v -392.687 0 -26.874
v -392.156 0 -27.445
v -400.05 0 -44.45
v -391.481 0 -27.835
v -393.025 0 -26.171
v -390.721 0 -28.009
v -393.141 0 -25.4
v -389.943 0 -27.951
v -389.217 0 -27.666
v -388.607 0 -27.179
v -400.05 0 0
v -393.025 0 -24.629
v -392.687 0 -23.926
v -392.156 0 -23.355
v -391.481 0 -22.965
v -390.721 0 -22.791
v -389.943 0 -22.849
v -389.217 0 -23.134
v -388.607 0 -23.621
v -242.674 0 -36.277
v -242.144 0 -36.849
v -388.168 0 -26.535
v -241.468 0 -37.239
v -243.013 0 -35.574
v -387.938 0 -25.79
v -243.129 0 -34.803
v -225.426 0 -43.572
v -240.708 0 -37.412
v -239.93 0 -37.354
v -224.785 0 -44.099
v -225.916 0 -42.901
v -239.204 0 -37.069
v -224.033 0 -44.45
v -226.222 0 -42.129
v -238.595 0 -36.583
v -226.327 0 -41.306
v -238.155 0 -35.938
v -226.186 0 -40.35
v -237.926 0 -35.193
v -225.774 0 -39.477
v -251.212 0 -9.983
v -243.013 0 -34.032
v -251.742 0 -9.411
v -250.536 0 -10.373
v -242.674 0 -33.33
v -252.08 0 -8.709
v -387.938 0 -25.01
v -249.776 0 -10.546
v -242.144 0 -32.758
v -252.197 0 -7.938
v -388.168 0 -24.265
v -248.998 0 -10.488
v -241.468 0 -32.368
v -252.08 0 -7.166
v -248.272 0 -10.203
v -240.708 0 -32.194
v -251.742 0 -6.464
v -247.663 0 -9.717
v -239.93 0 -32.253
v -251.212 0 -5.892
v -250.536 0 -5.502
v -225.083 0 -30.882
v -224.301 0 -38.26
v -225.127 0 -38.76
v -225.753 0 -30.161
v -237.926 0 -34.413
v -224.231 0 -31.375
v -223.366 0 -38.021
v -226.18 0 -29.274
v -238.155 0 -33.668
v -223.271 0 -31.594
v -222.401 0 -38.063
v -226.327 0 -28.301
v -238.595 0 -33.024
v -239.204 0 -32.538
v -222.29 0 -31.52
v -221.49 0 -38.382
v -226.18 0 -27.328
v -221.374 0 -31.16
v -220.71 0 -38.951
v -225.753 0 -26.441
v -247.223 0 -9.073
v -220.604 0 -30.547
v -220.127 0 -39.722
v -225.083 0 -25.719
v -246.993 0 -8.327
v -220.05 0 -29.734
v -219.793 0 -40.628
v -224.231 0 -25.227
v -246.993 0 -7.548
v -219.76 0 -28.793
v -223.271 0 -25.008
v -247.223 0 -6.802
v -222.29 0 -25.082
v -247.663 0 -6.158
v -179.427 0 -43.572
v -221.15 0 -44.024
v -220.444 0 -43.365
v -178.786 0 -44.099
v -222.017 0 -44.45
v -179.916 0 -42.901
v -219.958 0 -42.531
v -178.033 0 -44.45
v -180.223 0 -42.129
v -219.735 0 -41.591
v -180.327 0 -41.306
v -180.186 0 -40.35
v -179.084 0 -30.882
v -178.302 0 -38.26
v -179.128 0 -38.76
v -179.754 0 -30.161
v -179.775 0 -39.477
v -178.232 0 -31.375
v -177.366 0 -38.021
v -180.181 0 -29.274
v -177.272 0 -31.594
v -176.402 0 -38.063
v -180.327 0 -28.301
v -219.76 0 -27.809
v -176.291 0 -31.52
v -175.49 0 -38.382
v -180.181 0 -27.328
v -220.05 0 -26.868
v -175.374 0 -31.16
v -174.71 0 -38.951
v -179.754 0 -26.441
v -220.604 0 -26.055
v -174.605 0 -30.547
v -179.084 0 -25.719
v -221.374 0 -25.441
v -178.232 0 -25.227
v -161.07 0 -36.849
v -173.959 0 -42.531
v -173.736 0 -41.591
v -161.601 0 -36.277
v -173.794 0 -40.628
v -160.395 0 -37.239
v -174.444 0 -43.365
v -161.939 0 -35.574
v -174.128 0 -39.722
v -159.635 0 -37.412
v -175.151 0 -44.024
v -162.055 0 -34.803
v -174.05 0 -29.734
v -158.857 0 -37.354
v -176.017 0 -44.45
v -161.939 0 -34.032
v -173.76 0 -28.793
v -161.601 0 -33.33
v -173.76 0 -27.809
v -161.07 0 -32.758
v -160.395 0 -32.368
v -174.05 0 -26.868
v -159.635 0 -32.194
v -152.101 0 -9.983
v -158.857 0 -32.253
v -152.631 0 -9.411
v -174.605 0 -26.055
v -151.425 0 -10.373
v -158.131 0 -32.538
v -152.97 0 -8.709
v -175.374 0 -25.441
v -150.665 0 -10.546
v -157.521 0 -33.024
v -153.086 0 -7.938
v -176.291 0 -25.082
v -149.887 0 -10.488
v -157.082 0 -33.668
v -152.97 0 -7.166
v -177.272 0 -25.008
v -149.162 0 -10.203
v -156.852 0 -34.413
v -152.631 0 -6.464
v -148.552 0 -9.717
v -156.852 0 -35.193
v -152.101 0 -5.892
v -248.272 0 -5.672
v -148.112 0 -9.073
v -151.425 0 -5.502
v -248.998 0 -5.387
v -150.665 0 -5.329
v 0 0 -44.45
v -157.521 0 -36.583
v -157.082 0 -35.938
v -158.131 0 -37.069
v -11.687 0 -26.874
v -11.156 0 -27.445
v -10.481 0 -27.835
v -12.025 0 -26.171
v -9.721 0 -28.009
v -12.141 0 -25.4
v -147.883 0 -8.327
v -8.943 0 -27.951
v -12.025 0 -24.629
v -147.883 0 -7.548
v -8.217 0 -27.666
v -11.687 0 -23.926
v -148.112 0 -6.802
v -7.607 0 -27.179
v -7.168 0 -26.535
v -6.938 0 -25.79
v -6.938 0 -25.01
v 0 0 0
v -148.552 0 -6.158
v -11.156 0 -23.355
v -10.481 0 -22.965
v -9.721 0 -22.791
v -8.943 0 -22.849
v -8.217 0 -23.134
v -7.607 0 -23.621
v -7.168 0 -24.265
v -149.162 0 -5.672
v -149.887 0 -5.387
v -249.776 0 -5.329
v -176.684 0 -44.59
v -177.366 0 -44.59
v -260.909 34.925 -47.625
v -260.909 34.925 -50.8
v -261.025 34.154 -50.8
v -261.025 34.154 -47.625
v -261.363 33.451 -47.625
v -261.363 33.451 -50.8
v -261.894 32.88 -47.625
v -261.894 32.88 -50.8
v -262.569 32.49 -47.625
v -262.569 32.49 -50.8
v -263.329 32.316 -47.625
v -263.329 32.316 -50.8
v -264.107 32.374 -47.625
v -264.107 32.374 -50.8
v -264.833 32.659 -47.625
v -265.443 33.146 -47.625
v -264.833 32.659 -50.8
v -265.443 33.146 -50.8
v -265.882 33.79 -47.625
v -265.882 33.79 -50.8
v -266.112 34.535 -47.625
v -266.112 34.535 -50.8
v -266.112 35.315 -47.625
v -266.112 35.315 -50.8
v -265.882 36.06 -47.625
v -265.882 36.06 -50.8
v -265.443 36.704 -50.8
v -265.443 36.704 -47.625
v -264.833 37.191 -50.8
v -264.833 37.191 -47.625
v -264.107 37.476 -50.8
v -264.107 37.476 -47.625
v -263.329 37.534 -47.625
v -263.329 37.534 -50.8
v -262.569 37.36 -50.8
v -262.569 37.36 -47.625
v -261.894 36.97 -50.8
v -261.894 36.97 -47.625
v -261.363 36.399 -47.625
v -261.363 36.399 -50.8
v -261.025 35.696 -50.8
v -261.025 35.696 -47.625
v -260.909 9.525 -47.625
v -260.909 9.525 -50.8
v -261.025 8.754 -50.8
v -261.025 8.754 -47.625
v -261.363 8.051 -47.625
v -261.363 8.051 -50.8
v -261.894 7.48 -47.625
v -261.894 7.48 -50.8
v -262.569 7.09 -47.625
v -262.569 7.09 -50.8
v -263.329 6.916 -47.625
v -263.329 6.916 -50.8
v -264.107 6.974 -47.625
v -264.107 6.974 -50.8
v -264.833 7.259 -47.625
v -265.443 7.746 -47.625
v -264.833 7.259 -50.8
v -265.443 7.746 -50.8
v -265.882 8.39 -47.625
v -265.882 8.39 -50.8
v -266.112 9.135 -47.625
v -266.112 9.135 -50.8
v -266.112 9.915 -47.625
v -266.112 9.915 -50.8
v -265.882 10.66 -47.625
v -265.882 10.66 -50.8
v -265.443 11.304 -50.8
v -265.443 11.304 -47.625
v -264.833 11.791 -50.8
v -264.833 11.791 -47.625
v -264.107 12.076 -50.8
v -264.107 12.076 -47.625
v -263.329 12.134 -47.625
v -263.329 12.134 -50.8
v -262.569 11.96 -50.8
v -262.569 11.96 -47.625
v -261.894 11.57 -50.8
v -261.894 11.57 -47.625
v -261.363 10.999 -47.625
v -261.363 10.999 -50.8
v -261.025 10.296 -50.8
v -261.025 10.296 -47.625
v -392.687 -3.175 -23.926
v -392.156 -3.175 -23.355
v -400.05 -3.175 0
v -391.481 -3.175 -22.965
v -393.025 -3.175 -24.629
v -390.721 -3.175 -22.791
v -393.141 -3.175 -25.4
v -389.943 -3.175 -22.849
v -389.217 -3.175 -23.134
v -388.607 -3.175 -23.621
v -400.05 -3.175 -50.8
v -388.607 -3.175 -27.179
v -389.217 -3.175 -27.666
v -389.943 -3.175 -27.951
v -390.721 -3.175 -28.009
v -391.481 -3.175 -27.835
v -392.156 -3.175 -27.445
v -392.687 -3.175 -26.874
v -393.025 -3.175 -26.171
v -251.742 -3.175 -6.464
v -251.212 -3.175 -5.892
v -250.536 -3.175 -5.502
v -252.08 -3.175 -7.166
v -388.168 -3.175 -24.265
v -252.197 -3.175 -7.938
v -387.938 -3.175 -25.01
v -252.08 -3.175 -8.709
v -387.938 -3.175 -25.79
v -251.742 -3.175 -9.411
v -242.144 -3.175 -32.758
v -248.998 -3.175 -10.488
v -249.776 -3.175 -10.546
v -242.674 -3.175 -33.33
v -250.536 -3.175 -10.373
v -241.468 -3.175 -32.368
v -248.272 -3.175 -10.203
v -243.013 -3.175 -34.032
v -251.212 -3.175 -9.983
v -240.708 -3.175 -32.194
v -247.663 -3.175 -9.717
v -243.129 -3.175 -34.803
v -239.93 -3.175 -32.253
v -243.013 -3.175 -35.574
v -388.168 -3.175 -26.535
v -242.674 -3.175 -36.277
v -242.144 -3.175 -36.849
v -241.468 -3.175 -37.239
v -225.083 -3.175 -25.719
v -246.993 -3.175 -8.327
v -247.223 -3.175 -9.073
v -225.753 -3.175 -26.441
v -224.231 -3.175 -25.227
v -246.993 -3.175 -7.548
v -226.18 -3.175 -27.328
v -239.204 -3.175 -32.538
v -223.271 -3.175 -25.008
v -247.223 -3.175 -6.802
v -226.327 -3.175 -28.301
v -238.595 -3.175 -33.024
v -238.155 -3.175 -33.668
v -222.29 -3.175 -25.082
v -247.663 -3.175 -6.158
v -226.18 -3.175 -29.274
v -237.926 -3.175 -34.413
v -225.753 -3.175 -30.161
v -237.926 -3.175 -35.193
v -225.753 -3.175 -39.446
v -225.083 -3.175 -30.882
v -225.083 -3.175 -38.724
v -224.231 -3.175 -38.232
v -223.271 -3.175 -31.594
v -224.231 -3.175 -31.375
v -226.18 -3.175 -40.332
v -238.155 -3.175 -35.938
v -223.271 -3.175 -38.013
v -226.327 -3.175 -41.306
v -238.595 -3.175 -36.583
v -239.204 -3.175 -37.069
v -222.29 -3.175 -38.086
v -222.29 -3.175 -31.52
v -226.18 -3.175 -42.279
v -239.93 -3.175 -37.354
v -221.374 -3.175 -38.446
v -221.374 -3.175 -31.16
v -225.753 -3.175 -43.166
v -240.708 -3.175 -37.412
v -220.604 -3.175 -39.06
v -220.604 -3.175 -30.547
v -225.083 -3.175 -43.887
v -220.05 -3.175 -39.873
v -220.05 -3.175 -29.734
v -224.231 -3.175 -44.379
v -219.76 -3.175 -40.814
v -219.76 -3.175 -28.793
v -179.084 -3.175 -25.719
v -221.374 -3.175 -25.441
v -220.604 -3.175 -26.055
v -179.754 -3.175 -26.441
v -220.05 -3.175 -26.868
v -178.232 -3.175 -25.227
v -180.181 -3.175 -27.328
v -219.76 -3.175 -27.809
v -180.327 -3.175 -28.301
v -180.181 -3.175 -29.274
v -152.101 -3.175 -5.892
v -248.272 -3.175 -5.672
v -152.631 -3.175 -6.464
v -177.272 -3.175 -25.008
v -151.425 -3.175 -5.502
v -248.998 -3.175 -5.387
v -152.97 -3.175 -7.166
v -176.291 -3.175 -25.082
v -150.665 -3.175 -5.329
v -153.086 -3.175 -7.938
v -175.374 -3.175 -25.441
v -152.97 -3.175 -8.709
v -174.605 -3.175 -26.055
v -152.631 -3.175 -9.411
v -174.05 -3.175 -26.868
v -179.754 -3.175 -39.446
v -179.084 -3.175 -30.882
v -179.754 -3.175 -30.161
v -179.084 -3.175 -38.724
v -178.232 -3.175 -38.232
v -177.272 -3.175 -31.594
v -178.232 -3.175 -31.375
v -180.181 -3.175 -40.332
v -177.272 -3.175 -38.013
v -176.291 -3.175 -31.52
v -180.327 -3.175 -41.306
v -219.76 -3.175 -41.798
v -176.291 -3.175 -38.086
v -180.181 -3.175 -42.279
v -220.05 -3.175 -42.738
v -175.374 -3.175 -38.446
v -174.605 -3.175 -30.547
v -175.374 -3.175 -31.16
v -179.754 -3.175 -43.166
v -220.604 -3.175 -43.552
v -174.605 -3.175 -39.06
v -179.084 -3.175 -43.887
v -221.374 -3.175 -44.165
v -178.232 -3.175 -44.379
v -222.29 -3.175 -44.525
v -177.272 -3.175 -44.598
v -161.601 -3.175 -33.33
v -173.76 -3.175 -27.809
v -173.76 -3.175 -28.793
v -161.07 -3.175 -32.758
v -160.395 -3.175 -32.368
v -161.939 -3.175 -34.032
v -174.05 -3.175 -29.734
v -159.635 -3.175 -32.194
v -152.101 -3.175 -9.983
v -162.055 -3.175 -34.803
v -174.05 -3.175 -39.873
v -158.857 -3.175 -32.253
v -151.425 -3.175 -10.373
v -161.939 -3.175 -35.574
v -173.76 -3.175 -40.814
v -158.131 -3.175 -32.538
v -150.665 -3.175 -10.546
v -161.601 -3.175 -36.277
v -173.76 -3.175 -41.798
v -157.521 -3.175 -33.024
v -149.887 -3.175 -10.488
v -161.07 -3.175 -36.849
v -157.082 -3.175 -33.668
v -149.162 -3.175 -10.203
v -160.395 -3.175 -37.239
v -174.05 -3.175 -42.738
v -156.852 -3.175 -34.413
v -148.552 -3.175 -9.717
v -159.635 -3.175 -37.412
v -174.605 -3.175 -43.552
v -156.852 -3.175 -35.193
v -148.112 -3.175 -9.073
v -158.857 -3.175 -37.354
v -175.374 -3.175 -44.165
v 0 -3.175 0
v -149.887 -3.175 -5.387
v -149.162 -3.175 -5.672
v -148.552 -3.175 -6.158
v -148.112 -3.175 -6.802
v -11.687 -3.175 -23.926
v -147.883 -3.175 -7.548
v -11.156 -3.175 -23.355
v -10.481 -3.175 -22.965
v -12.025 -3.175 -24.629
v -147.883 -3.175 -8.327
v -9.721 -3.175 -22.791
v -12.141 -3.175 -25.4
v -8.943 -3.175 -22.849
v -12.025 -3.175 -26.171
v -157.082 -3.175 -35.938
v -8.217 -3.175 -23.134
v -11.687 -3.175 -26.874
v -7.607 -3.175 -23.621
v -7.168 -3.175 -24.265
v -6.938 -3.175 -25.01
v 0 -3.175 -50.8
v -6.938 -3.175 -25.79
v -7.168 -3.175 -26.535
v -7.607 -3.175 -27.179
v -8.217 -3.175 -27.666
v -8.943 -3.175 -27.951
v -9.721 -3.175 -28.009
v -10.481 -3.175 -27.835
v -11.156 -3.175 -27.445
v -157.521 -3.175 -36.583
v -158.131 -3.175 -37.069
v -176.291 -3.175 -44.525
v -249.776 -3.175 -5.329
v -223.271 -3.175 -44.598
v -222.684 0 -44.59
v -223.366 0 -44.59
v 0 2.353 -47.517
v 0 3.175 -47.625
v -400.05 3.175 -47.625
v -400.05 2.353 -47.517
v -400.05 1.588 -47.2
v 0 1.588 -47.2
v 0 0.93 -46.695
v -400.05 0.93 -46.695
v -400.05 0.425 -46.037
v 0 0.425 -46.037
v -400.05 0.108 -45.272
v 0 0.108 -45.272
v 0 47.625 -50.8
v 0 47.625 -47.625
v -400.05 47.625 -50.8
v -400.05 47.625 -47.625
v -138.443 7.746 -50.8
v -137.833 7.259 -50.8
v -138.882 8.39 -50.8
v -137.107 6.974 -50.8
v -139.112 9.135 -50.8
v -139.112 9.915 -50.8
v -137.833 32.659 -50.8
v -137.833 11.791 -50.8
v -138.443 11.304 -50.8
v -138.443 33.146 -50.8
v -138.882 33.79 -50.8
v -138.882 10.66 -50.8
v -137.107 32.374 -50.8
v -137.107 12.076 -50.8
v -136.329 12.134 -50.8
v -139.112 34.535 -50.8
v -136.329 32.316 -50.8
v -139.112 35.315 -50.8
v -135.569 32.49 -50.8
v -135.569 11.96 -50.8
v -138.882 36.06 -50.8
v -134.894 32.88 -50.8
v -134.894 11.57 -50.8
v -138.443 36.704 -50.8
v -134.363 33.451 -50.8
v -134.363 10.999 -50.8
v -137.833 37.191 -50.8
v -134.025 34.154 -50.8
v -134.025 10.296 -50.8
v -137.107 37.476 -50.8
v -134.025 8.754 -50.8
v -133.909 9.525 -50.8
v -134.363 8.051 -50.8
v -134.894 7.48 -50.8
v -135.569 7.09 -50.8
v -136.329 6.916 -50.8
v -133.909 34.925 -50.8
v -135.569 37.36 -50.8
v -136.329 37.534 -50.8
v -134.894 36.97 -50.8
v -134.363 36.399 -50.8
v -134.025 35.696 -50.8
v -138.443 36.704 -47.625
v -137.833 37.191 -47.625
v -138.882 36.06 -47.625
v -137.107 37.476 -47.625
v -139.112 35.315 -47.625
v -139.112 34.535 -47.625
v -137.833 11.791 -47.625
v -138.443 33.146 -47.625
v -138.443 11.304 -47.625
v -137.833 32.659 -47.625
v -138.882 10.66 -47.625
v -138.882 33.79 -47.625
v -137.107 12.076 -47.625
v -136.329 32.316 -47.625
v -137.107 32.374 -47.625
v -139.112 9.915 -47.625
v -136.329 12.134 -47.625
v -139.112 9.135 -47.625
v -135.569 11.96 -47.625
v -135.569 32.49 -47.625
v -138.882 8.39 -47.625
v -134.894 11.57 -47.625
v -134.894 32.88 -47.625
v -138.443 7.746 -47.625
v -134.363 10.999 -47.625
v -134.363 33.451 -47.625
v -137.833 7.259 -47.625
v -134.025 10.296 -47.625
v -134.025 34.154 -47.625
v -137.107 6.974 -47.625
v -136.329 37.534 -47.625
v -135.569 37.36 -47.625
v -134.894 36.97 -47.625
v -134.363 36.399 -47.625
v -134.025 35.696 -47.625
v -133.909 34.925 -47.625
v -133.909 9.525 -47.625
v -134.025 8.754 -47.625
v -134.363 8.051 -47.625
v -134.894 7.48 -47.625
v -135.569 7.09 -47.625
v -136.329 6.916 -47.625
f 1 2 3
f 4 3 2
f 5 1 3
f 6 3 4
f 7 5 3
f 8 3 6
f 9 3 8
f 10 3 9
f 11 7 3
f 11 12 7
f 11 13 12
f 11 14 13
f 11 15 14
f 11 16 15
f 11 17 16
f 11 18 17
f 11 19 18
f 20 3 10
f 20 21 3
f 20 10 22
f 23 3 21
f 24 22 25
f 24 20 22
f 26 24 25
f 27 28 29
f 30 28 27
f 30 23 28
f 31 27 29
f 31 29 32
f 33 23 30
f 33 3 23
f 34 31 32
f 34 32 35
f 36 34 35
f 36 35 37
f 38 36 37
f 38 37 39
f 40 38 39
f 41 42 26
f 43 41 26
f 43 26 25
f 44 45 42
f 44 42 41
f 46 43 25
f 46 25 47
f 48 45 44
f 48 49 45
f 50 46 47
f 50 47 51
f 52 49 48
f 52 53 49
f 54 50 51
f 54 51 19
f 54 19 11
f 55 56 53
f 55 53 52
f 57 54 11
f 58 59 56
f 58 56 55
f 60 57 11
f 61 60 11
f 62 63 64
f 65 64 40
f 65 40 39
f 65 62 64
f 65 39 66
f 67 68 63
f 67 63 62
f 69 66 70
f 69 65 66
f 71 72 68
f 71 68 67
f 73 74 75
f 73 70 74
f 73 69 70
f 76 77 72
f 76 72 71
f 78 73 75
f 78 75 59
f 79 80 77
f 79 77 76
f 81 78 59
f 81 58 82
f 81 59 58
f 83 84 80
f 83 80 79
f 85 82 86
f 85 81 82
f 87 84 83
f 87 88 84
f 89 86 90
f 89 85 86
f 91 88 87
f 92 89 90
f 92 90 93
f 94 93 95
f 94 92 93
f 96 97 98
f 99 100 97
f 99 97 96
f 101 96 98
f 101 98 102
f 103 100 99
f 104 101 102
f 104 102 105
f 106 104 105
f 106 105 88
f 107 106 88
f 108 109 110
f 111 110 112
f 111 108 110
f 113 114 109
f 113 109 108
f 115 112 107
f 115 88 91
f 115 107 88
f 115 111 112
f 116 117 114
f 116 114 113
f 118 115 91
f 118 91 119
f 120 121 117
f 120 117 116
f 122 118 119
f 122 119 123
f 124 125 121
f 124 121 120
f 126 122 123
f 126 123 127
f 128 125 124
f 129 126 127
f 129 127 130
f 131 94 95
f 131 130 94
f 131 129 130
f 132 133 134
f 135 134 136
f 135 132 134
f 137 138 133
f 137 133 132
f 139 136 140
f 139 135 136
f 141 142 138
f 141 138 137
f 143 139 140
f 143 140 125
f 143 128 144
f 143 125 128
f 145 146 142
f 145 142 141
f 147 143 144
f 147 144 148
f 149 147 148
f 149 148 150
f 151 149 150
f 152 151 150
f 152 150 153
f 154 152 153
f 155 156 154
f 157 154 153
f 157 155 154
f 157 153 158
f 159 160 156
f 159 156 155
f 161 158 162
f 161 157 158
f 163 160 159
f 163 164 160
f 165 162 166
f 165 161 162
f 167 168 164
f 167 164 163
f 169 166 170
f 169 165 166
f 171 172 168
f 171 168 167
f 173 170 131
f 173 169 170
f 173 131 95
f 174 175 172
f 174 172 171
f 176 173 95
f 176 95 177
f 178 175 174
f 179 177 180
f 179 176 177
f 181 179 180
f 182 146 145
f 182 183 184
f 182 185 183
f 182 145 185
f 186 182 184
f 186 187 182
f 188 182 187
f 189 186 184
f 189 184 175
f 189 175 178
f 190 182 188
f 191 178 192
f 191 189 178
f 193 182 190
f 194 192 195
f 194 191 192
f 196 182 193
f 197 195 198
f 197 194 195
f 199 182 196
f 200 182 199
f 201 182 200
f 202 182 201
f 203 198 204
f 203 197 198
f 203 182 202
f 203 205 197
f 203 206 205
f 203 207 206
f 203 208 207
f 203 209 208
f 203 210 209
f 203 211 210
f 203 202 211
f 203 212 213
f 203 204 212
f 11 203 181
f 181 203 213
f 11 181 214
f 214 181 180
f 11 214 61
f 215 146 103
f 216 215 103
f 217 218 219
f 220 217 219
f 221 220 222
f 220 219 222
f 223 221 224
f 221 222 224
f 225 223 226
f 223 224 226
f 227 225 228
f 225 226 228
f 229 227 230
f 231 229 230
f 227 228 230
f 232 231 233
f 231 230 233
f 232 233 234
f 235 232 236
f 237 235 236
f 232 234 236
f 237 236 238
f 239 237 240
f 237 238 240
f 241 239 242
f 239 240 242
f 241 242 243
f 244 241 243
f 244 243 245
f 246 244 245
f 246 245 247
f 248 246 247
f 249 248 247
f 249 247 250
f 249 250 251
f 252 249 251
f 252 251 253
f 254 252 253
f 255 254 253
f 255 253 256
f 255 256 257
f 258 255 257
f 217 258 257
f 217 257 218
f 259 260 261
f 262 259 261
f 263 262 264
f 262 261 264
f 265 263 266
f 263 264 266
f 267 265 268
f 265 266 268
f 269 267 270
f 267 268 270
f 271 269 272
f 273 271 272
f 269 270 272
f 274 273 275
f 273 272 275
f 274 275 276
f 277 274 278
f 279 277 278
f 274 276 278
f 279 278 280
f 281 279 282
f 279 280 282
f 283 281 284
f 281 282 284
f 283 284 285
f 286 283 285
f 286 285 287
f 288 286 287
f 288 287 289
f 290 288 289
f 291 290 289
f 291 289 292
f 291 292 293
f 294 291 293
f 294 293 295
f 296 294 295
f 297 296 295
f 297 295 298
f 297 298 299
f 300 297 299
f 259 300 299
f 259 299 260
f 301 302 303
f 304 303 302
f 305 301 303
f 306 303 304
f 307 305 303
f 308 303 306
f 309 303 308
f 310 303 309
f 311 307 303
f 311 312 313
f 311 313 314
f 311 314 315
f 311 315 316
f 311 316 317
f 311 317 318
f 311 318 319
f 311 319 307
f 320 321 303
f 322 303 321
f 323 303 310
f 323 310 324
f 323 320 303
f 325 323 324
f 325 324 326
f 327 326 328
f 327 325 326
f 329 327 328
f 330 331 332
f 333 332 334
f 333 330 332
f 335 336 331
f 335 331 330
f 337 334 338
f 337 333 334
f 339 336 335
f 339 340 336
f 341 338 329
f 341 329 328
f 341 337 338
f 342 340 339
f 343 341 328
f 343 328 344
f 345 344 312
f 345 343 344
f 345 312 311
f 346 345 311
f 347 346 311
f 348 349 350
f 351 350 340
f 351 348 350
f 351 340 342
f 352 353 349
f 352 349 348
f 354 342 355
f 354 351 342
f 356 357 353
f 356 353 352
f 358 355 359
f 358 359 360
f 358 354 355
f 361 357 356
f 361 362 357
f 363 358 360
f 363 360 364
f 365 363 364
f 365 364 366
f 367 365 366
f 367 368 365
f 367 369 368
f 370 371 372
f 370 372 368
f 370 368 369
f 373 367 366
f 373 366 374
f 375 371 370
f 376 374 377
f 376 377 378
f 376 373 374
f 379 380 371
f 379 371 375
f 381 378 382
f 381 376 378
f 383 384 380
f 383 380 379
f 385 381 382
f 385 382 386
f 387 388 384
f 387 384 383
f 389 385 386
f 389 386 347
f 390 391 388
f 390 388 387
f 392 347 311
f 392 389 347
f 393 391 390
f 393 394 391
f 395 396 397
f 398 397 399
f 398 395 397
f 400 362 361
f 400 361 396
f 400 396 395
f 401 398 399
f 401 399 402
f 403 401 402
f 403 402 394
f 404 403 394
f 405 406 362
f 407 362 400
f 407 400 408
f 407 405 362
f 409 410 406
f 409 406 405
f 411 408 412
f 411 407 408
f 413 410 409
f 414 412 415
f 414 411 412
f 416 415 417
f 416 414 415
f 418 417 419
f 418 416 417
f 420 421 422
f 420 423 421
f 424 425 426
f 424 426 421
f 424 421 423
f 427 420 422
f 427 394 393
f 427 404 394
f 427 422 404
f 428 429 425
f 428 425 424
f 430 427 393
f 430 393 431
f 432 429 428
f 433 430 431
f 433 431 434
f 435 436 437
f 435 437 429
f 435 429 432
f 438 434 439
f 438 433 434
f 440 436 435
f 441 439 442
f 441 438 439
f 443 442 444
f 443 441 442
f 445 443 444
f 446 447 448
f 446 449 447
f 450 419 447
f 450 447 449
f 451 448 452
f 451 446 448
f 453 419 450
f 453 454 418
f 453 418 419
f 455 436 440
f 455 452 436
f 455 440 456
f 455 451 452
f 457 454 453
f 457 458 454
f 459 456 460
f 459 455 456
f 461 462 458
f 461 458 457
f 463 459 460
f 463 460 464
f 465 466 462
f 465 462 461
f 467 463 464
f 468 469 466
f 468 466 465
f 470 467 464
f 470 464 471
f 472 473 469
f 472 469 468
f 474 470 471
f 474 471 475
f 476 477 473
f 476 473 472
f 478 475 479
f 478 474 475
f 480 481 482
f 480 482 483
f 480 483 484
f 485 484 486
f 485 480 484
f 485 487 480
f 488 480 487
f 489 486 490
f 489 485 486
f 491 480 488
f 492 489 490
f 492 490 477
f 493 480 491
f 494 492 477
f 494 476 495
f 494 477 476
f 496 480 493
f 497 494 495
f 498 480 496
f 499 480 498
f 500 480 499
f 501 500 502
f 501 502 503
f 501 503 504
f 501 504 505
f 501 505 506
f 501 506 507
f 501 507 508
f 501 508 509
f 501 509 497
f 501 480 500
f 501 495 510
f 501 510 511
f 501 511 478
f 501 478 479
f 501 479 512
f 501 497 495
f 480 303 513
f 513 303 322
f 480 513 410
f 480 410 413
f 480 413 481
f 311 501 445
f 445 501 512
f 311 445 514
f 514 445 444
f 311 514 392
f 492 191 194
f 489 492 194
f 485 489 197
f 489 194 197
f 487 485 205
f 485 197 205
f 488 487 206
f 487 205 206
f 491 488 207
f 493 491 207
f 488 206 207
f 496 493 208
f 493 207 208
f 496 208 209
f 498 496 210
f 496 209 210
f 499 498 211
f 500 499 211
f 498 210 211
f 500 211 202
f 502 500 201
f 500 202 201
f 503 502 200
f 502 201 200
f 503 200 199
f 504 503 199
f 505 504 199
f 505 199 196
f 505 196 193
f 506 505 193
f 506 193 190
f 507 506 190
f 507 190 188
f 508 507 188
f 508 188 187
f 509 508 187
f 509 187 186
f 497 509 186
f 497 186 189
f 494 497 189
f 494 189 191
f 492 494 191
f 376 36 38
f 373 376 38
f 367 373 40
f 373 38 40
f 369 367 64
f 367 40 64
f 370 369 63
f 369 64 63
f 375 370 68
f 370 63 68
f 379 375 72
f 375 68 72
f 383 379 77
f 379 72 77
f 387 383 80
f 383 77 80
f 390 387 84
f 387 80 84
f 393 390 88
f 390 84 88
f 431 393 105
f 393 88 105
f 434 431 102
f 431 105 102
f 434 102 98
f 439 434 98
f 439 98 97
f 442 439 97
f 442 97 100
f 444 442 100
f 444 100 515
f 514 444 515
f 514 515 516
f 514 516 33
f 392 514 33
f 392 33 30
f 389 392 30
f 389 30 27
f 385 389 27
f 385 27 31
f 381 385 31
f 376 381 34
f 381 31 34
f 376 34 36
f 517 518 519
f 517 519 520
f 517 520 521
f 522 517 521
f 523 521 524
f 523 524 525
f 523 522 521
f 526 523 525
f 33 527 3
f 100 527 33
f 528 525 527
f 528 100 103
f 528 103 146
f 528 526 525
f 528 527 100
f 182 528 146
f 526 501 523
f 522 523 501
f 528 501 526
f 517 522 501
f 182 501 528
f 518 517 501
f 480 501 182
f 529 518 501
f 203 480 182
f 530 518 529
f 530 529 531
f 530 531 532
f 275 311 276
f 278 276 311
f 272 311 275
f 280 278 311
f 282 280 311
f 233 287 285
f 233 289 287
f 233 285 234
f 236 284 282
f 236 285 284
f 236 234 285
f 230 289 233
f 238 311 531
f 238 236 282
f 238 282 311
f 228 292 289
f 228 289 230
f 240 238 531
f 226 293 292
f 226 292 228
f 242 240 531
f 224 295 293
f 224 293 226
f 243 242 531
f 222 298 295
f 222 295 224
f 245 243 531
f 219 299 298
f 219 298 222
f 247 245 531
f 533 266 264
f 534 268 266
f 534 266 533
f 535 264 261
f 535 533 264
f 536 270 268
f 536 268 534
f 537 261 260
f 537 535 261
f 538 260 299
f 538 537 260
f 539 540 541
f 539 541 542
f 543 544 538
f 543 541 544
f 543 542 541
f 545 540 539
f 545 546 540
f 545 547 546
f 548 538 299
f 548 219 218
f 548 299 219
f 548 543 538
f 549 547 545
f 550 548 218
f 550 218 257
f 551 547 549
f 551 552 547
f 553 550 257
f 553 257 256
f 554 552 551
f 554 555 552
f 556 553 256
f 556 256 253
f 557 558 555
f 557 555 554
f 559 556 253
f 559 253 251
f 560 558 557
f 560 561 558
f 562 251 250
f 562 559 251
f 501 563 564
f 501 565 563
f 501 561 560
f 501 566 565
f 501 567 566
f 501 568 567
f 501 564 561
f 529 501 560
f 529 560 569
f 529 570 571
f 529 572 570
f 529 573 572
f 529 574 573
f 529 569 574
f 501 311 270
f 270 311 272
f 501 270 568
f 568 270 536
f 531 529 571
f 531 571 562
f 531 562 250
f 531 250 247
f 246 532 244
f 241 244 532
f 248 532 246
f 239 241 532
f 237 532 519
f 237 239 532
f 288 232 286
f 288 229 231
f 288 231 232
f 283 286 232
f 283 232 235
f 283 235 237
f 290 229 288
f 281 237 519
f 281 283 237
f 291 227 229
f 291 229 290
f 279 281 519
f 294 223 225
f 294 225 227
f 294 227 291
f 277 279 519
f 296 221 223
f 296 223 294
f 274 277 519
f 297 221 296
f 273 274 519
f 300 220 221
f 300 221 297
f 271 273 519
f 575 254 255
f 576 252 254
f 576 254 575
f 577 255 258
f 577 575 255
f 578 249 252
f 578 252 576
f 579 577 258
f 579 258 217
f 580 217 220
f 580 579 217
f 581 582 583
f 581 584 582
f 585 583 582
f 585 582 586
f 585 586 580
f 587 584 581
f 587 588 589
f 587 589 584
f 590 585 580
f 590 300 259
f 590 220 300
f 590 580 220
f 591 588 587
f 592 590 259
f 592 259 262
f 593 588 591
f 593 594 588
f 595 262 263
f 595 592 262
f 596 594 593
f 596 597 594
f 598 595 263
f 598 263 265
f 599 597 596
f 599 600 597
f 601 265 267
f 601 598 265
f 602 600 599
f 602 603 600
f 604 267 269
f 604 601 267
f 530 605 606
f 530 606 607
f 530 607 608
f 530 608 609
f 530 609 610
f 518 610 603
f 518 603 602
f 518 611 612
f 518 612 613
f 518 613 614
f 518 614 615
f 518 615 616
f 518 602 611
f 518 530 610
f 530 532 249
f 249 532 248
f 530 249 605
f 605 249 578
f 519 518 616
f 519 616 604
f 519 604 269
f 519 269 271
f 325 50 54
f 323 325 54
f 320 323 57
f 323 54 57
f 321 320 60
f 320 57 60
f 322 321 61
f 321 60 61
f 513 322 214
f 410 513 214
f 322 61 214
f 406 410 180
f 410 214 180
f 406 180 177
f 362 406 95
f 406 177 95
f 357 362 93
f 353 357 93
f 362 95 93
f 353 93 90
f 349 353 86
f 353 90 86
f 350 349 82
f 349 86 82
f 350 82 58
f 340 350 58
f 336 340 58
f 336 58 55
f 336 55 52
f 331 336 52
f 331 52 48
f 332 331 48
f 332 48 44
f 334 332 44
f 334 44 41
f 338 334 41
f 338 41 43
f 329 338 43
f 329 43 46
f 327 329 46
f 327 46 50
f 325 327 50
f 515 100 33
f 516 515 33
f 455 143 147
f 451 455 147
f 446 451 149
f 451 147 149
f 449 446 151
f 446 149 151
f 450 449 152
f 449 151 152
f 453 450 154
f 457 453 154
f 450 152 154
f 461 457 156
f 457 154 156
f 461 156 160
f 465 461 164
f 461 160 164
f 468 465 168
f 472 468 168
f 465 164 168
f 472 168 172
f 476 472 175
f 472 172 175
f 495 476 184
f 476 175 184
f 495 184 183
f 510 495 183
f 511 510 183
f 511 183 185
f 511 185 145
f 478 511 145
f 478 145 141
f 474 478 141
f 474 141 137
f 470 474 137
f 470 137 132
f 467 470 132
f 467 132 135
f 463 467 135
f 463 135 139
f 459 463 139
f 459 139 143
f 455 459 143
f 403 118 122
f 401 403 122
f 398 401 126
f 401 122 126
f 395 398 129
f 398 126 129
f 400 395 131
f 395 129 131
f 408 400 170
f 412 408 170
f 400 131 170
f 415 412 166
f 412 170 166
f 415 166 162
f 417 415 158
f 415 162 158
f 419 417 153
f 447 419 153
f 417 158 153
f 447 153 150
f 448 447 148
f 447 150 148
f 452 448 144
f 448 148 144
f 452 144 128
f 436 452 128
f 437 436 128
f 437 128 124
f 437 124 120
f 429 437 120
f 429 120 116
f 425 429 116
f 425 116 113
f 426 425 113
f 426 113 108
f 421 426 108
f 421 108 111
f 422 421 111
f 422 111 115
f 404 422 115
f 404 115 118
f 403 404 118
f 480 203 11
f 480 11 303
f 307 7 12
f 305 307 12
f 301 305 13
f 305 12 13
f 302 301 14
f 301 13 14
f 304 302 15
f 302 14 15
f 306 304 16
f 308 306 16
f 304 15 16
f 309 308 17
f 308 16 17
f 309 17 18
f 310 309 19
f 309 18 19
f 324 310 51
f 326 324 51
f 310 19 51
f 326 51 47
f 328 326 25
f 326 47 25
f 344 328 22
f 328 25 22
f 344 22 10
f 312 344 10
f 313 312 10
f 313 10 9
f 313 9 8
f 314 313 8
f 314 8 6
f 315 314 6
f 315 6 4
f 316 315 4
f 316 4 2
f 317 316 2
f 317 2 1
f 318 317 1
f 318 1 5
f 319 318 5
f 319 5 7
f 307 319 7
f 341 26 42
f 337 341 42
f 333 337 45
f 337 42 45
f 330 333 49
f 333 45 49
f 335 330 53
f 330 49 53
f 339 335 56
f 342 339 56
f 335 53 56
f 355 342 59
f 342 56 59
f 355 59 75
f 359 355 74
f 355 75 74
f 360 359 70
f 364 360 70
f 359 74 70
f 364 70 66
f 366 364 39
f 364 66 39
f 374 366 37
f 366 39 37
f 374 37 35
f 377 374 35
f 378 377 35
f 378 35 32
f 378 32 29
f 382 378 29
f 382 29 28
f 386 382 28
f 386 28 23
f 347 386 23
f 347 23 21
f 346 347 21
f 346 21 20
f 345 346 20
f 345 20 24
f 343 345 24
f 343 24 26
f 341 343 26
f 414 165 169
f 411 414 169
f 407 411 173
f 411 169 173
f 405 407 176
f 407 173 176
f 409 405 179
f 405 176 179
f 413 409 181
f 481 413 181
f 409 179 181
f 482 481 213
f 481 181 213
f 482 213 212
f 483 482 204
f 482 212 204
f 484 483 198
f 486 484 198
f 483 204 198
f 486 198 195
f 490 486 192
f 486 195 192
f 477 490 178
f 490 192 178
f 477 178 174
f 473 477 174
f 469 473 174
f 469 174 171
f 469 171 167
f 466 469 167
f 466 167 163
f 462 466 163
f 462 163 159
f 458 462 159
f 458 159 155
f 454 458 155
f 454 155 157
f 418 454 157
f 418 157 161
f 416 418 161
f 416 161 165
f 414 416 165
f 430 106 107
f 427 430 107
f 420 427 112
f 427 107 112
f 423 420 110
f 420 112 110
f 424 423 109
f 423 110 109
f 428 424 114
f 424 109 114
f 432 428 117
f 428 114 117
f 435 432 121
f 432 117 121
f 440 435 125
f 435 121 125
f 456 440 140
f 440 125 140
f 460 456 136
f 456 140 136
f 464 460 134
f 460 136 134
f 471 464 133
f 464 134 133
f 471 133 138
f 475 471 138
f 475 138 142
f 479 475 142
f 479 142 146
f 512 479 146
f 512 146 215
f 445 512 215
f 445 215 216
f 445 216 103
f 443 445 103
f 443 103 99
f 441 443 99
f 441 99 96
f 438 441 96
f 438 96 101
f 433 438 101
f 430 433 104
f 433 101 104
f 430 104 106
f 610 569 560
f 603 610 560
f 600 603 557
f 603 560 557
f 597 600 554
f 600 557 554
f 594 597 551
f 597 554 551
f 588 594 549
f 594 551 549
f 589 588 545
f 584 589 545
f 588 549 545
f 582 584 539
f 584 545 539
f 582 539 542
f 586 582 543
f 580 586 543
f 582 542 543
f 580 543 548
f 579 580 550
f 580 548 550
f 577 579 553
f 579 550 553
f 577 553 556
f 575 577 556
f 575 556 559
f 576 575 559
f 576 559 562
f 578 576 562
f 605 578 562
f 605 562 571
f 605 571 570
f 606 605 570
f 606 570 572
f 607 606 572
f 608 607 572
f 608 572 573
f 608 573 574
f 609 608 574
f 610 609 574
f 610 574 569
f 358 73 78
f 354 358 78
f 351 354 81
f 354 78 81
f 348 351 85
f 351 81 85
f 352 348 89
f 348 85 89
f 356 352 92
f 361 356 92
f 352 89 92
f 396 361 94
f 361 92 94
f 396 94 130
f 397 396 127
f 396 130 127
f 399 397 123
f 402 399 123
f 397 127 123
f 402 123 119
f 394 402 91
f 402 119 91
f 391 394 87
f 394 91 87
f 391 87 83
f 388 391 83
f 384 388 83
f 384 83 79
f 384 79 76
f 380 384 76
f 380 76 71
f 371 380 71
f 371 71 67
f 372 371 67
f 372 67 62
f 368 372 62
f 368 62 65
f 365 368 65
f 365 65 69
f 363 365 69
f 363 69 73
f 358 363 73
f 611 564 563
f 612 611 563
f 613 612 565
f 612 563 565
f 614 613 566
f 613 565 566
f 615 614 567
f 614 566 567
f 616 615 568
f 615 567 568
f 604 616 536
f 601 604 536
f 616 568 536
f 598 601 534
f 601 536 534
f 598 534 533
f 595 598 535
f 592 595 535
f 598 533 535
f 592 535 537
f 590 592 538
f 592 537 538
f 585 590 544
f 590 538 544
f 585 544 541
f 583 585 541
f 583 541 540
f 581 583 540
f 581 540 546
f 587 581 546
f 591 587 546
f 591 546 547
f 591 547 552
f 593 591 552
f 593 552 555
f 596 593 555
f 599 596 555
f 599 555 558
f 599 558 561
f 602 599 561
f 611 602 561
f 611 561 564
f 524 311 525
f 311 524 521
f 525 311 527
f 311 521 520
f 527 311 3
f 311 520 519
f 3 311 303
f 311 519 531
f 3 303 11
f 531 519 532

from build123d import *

# Parameters (mm, degrees)
F1_DEPTH = 400.05
F2_R     = 2.6162
F2_R_2   = 3.302
F3_DEPTH = 3.176
F4_R     = 2.6162
F5_DEPTH = 50.801


with BuildPart() as f1:
    # F0 (on Right) → F1 (new body)
    with BuildSketch(Plane.YZ):
        with BuildLine():
            Line((0, -44.45), (0, 0))
            Line((0, 0), (-3.175, 0))
            Line((-3.175, 0), (-3.175, -50.8))
            Line((-3.175, -50.8), (47.625, -50.8))
            Line((47.625, -50.8), (47.625, -47.625))
            Line((47.625, -47.625), (3.175, -47.625))
            ThreePointArc((3.175, -47.625), (0.929936, -46.695064), (0, -44.45))
        make_face()
    extrude(amount=-F1_DEPTH)

    # F2 (on face) → F3 (cut, through all)
    with BuildSketch(Plane(origin=(0, 0, 0), x_dir=(-1, 0, 0), z_dir=(0, 1, 0))):
        with Locations((9.525, -25.4)):
            Circle(F2_R)
        with Locations((390.525, -25.4)):
            Circle(F2_R)
        with Locations((177.0253, -41.305675)):
            Circle(F2_R_2)
        with Locations((223.0247, -41.305675)):
            Circle(F2_R_2)
        with Locations((177.0253, -28.300875)):
            Circle(F2_R_2)
        with Locations((223.0247, -28.300875)):
            Circle(F2_R_2)
        with Locations((159.439057, -34.803275)):
            Circle(F2_R)
        with Locations((240.5126, -34.803275)):
            Circle(F2_R)
        with Locations((249.5804, -7.9375)):
            Circle(F2_R)
        with Locations((150.4696, -7.9375)):
            Circle(F2_R)
    extrude(amount=-F3_DEPTH, mode=Mode.SUBTRACT)

    # F4 (on face) → F5 (cut, through all)
    with BuildSketch(Plane(origin=(0, 0, -50.8), x_dir=(1, 0, 0), z_dir=(0, 0, -1))):
        with Locations((-136.525, -9.525)):
            Circle(F4_R)
        with Locations((-136.525, -34.925)):
            Circle(F4_R)
        with Locations((-263.525, -9.525)):
            Circle(F4_R)
        with Locations((-263.525, -34.925)):
            Circle(F4_R)
    extrude(amount=-F5_DEPTH, mode=Mode.SUBTRACT)


solid = f1.part
